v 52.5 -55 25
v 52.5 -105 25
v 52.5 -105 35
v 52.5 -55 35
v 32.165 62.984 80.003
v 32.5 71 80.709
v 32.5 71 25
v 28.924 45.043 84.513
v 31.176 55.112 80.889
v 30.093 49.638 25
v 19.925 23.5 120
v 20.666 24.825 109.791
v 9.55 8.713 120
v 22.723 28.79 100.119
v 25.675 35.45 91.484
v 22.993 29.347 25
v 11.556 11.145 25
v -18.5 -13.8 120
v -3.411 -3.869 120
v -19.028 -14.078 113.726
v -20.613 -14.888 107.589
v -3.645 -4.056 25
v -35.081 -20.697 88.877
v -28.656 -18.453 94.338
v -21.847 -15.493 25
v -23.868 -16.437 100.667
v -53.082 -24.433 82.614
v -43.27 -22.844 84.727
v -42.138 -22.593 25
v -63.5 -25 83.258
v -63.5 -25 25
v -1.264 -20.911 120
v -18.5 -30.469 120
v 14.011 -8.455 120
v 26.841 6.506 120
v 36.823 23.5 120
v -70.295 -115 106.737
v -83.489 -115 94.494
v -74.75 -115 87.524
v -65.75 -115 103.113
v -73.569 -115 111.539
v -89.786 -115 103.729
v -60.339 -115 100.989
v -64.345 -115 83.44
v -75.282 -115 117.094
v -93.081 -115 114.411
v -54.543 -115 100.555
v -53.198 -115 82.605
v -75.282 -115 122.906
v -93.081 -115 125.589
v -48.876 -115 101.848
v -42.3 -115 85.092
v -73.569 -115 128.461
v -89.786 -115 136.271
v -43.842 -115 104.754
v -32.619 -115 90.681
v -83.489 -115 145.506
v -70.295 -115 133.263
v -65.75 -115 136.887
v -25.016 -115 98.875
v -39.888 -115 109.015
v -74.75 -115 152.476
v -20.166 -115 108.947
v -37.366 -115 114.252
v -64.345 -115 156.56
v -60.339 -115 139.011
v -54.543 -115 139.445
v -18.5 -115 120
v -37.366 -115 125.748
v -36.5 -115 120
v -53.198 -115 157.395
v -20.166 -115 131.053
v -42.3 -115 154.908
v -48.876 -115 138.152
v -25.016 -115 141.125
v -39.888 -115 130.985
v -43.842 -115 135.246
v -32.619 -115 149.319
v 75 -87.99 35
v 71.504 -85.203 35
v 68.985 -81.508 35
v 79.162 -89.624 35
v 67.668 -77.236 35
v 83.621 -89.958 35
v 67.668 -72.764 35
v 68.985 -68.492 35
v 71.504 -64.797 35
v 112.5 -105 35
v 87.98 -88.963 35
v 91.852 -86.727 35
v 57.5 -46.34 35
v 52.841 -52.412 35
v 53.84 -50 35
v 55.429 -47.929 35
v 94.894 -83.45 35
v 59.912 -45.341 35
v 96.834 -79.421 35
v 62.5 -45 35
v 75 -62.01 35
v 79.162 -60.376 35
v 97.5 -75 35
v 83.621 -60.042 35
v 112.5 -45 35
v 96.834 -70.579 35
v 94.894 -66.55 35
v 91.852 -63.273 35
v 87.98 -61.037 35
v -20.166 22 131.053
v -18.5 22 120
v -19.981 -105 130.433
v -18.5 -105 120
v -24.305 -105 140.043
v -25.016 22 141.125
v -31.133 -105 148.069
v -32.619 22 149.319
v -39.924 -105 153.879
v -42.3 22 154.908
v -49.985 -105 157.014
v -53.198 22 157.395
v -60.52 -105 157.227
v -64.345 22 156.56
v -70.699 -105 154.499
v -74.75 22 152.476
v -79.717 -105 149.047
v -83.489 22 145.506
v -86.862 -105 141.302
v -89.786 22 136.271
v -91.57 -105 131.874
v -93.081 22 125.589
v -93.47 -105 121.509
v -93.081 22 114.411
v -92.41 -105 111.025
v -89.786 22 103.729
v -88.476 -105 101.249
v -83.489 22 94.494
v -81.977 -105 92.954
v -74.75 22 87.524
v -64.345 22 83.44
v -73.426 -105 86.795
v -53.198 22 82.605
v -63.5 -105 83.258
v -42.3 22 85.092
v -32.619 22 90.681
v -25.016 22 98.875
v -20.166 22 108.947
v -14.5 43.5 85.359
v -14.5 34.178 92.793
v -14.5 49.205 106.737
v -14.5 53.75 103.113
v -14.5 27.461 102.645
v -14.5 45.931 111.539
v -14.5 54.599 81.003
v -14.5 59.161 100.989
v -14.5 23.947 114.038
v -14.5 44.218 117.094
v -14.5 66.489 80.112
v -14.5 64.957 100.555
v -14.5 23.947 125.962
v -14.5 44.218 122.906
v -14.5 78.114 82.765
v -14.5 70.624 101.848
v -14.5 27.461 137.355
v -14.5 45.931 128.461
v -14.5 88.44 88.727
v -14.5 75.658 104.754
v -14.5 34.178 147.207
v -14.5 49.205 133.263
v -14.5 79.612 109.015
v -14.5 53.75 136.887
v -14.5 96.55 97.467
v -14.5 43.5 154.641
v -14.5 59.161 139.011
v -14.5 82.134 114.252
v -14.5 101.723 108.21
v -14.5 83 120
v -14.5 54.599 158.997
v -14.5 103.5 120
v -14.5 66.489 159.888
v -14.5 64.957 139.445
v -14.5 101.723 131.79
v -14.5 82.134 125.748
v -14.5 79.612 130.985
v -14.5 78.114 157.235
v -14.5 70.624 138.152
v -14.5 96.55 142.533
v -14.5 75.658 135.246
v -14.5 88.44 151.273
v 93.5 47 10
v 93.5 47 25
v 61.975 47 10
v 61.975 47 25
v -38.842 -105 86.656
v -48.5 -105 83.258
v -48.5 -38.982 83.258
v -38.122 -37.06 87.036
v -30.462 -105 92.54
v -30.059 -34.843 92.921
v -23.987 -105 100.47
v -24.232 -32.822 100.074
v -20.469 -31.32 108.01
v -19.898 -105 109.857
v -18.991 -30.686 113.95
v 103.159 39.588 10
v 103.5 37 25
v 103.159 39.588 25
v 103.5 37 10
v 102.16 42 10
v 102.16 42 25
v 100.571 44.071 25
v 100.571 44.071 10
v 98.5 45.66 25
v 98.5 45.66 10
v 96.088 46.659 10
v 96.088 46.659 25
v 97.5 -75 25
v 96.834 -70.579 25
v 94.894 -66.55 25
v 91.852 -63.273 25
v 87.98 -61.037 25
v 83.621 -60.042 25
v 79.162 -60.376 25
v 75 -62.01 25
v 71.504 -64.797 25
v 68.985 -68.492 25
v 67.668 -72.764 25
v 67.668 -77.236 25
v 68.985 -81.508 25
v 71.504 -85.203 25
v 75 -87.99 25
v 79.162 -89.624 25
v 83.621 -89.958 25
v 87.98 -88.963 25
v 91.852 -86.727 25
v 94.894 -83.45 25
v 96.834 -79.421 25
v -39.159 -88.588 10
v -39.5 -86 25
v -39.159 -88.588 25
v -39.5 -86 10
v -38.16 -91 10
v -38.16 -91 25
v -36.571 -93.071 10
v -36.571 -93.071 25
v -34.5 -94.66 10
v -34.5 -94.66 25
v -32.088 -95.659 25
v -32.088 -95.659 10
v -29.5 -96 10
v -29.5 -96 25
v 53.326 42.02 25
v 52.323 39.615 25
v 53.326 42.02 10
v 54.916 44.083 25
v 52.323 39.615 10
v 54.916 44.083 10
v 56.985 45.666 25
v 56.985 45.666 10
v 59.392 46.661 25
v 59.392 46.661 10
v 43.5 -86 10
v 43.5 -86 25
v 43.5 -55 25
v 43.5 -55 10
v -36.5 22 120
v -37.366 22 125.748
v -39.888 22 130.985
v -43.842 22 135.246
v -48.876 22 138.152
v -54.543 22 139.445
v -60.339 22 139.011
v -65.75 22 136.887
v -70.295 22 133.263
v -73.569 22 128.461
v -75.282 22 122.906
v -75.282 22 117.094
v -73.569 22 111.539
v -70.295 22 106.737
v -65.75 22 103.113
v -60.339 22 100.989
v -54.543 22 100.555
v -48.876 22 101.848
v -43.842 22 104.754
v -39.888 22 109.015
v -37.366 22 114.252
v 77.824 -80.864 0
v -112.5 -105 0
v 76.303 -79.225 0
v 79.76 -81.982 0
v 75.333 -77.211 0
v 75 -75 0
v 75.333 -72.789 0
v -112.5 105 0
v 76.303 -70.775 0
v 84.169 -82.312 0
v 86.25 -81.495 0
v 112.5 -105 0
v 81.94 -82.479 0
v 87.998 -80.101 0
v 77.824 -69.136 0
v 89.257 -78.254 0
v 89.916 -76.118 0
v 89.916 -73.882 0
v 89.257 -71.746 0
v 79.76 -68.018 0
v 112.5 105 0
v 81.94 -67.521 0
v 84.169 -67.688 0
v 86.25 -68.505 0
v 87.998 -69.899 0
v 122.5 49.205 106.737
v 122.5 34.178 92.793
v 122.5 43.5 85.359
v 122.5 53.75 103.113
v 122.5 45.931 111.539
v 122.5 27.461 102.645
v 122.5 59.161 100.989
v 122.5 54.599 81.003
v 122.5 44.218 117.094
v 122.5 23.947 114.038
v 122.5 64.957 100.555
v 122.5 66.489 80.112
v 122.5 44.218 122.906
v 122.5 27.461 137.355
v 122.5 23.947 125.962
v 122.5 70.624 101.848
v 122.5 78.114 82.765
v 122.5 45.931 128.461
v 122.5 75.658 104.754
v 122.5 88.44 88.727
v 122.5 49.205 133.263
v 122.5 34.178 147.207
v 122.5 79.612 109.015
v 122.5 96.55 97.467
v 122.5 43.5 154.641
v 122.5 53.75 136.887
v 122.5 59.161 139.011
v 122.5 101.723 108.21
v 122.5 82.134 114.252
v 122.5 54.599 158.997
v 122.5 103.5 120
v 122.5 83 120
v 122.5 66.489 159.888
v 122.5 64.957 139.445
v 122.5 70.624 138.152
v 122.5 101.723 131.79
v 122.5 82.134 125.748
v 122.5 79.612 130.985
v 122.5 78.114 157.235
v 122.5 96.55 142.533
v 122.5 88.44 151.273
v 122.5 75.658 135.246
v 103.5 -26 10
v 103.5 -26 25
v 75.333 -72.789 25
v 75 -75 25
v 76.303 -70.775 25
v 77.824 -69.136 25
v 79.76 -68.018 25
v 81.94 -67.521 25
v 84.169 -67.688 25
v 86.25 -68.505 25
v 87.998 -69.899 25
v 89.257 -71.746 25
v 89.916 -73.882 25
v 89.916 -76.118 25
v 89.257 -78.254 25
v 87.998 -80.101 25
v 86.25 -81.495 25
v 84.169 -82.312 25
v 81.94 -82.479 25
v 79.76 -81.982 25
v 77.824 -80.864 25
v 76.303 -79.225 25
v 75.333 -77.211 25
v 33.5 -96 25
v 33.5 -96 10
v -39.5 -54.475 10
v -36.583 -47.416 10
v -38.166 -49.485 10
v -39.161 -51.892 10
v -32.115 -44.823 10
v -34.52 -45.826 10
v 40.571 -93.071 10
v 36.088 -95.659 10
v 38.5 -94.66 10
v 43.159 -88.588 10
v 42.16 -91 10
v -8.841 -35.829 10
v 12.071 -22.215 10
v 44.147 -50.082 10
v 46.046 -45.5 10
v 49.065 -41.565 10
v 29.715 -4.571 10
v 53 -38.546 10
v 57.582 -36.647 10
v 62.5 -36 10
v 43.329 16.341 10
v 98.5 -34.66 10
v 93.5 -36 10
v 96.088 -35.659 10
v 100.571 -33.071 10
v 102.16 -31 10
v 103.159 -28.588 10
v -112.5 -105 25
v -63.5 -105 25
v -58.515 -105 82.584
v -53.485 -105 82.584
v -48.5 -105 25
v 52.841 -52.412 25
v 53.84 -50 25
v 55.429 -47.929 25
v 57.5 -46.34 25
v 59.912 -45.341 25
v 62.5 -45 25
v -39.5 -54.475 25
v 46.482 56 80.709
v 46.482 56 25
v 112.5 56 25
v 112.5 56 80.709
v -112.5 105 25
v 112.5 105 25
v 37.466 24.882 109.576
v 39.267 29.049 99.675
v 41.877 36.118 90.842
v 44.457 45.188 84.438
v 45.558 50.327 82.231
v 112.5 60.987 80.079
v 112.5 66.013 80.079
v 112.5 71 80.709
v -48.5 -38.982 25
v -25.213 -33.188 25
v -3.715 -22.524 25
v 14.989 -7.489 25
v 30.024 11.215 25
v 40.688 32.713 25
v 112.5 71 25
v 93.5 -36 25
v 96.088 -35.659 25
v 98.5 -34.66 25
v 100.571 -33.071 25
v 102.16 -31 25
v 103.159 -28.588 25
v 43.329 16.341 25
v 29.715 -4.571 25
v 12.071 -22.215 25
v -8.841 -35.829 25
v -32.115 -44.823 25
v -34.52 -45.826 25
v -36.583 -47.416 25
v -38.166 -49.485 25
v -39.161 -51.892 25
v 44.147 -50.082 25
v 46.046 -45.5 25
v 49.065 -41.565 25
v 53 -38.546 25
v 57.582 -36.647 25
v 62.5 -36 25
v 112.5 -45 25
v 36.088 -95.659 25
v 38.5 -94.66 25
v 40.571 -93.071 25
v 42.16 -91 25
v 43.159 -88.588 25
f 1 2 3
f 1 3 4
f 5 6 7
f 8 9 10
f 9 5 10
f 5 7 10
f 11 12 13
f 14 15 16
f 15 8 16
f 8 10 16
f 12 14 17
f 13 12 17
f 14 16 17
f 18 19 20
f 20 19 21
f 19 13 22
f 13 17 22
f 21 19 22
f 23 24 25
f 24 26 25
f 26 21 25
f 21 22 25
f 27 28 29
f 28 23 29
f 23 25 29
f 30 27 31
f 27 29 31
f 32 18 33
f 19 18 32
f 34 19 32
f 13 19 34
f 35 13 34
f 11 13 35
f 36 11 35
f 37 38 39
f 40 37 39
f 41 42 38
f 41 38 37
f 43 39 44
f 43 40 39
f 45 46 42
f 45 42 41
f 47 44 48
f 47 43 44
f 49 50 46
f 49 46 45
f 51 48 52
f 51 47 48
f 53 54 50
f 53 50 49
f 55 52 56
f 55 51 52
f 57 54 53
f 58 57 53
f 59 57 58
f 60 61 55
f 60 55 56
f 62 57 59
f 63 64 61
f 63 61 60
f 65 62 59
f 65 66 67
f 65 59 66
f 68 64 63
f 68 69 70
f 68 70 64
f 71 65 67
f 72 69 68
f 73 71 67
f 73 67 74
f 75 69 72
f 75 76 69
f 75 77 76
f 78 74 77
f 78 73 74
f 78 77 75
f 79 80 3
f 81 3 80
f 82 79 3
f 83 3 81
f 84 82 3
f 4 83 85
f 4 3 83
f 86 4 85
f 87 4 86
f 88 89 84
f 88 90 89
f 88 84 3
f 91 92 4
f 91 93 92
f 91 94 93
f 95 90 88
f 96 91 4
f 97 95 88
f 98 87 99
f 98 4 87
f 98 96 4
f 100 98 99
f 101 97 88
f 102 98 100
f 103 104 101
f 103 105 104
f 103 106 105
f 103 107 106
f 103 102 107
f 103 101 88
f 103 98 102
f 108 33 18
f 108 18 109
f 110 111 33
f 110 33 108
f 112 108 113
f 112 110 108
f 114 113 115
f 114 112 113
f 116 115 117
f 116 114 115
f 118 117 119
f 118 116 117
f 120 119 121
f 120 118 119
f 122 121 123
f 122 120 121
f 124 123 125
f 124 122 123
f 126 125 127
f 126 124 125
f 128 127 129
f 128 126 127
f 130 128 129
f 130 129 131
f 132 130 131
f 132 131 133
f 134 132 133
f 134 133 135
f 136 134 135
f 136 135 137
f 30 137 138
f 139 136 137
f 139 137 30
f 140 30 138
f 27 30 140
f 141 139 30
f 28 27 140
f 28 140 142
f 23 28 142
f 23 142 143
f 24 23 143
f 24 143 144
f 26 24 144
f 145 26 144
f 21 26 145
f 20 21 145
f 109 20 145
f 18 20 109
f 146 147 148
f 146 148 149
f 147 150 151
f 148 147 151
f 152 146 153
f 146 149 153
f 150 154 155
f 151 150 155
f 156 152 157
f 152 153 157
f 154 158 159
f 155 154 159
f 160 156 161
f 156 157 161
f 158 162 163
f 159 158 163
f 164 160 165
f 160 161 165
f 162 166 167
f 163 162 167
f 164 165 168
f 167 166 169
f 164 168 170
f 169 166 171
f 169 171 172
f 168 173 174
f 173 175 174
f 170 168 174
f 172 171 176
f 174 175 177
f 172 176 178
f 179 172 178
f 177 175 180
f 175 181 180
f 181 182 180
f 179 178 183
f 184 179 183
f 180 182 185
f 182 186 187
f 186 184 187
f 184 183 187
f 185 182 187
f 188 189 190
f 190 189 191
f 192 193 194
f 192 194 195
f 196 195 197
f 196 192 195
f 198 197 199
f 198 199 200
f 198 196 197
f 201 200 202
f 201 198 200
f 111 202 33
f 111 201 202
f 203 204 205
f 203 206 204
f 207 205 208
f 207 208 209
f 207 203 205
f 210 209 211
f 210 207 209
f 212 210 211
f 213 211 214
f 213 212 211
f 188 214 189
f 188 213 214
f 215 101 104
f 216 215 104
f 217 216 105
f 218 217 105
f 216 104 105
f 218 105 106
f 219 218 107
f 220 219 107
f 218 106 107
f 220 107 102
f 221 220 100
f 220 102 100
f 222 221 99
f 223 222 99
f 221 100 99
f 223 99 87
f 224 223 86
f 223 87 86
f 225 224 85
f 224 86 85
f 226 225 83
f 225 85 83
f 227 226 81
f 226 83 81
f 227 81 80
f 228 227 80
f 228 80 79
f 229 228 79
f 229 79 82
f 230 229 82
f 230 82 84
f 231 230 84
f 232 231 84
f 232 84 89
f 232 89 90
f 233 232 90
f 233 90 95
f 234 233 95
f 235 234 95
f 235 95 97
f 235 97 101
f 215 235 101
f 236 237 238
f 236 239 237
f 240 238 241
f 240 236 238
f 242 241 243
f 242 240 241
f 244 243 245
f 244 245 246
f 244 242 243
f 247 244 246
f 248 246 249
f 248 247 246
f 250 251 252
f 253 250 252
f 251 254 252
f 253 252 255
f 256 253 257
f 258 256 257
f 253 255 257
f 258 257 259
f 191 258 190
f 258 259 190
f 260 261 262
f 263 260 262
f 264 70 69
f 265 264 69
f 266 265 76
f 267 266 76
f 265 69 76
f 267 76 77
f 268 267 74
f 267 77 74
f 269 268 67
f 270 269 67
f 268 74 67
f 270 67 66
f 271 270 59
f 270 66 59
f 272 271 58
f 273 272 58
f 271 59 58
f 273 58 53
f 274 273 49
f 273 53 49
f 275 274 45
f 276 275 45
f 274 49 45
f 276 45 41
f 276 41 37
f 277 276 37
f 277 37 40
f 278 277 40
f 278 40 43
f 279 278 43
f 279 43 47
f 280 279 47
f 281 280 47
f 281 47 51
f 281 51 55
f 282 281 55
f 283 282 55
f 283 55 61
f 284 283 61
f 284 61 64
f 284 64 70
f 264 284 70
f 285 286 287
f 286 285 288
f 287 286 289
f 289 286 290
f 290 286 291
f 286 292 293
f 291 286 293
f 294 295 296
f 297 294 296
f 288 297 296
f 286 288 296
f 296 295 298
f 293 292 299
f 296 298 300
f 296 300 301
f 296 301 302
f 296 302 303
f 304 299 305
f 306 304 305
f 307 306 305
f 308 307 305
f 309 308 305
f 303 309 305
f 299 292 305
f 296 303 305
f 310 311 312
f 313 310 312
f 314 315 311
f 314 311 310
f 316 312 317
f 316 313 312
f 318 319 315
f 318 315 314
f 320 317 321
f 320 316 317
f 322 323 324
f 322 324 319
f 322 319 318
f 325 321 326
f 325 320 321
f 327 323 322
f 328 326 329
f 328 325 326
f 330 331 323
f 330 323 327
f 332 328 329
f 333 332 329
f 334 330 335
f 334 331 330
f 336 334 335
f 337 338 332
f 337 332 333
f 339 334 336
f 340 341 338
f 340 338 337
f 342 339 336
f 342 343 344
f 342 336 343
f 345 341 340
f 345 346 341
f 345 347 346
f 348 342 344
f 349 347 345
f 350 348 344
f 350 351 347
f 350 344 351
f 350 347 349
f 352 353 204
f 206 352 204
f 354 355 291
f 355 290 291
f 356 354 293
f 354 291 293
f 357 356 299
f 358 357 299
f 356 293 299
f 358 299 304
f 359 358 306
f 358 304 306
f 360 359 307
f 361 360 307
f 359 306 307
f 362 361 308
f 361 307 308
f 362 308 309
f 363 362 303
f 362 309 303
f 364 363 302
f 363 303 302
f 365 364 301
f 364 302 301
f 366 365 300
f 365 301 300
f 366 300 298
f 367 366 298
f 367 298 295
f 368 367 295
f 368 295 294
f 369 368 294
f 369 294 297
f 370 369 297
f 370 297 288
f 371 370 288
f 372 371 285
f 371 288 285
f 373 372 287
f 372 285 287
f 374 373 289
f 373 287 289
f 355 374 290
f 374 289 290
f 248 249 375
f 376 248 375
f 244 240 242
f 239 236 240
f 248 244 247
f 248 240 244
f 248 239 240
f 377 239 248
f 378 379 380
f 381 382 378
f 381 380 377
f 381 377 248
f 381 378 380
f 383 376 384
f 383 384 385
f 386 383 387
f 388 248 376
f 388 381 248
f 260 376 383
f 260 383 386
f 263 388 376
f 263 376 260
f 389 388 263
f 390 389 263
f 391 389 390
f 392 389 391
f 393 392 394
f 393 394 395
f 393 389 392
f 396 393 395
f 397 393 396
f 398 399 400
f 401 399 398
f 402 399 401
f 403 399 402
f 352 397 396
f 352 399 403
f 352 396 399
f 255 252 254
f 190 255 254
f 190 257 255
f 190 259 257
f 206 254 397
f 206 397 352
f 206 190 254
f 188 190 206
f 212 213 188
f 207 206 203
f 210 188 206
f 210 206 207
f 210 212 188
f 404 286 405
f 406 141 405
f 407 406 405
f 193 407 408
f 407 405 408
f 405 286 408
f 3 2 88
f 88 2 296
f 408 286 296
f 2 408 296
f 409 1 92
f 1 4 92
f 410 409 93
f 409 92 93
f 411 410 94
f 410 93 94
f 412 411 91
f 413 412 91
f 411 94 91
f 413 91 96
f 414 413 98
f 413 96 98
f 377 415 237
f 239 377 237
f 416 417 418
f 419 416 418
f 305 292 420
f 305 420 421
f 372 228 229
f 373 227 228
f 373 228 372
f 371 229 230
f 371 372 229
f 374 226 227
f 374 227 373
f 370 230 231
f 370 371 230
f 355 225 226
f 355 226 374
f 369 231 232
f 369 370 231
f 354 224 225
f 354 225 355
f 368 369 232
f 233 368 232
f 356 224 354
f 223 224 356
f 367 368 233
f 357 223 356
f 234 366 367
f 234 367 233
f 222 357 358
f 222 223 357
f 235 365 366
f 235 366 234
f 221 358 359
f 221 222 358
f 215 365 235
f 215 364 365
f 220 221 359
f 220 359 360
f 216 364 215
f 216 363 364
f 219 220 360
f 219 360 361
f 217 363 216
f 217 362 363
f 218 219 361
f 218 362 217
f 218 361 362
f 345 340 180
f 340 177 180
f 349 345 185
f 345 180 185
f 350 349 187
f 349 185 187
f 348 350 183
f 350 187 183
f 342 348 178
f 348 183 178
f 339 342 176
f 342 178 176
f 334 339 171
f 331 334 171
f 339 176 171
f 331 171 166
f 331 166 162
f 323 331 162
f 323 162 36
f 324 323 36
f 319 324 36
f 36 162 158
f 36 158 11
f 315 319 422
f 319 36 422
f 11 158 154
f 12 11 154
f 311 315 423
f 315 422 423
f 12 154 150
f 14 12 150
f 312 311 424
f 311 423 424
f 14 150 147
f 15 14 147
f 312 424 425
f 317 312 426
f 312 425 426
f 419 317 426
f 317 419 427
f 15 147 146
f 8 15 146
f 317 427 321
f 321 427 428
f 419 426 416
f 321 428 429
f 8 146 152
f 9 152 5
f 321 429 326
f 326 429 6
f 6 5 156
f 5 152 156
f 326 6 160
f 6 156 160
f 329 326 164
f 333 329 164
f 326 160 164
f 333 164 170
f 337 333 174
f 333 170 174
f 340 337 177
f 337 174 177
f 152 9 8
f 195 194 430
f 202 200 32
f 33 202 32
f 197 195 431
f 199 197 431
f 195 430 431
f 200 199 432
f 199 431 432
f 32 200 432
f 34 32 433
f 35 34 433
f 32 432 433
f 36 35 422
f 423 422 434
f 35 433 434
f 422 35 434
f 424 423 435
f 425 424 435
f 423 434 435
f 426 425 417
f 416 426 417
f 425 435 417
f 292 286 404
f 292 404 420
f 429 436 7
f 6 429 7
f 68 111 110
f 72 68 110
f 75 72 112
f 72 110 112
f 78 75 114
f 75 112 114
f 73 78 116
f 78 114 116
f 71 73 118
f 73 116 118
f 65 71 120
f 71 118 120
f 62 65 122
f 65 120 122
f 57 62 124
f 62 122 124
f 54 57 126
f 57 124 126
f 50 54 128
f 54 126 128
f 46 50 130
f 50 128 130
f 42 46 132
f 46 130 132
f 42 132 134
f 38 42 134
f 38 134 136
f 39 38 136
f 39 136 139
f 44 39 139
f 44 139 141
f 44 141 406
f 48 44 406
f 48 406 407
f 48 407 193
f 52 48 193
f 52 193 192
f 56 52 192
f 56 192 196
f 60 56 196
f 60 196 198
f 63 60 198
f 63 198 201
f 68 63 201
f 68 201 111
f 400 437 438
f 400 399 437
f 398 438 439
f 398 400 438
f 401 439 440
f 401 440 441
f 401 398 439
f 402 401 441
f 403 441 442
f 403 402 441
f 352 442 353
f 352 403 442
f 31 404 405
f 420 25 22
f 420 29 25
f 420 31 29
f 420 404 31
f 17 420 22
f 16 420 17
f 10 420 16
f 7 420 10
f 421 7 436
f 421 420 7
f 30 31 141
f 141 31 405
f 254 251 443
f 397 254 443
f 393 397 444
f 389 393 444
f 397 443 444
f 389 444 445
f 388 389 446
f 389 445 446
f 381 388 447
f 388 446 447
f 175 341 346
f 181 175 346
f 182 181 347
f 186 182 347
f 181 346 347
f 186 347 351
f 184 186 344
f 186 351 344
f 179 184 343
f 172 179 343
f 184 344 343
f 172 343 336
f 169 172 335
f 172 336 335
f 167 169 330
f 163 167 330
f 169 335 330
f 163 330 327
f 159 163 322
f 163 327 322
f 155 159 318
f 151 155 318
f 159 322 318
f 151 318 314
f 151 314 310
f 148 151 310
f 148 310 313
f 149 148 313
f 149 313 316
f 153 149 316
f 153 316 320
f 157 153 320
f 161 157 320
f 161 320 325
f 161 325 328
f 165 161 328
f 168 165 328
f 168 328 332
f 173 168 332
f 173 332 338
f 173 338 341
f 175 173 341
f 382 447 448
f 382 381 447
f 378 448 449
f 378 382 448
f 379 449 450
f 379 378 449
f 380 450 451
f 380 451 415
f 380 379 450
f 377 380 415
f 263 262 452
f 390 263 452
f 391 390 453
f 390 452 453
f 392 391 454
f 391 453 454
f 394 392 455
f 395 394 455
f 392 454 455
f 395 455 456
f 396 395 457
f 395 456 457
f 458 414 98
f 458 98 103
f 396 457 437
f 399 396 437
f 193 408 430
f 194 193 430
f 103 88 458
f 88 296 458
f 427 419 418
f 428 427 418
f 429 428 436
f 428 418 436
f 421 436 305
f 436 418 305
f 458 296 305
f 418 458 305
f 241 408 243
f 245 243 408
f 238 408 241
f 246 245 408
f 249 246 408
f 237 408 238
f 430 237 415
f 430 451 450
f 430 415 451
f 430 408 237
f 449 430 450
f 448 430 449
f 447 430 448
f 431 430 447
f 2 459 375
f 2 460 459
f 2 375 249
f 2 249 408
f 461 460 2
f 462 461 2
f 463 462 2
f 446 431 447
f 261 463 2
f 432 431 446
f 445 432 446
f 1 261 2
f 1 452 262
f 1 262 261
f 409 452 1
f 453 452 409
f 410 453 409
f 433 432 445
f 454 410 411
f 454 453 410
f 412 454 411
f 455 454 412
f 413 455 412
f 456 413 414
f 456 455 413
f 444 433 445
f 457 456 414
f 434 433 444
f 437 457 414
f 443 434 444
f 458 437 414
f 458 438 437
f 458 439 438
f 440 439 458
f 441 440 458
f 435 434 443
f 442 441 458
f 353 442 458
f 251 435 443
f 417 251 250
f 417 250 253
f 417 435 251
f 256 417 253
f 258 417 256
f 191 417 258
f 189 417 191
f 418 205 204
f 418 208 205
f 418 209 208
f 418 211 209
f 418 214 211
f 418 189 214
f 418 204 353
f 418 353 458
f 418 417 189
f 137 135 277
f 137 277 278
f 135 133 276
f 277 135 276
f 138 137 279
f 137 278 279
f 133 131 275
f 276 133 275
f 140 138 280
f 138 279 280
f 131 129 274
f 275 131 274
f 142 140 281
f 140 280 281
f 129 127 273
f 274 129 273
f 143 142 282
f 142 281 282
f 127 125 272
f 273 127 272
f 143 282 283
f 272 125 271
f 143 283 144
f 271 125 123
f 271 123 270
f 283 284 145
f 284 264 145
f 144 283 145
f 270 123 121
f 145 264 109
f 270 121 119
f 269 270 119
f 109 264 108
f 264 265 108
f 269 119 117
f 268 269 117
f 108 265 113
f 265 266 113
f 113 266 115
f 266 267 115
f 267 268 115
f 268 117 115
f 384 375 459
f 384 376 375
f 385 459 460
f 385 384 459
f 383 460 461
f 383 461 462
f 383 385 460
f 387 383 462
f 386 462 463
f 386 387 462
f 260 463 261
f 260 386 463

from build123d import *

# Parameters (mm, degrees)
F0_W            = 225
F0_H            = 210
F1_DEPTH        = 25
F3_DEPTH        = 95
F4_R            = 37.5
F5_DEPTH        = 10
F5_DEPTH_BACK   = 127
F6_R            = 40
F7_DEPTH        = 10
F7_DEPTH_BACK   = 127
F8_W            = 60
F8_H            = 60
F9_DEPTH        = 10
F10_R           = 10
F12_DEPTH       = 15
F14_D           = 15
F14_CBORE_D     = 30
F14_CBORE_DEPTH = 10
F15_R           = 10
F16_R           = 19.5
F17_DEPTH       = 220.001
F18_R           = 19.5
F19_DEPTH       = 235.001


with BuildPart() as f1:
    # F0 (on Top) → F1 (new body)
    with BuildSketch(Plane.XY):
        Rectangle(F0_W, F0_H)
    extrude(amount=F1_DEPTH)

    # F2 (on face) → F3 (join)
    with BuildSketch(Plane.XY.offset(25)):
        with BuildLine():
            Line((-63.5, -25), (-63.5, -105))
            Line((-63.5, -105), (-48.5, -105))
            Line((-48.5, -105), (-48.5, -38.981817))
            ThreePointArc((-48.5, -38.981817), (14.988853, -7.488853), (46.481817, 56))
            Line((46.481817, 56), (112.5, 56))
            Line((112.5, 56), (112.5, 71))
            Line((112.5, 71), (32.5, 71))
            ThreePointArc((32.5, 71), (4.382251, 3.117749), (-63.5, -25))
        make_face()
    extrude(amount=F3_DEPTH)

    # F4 (on face) → F5 (join, two sides)
    with BuildSketch(Plane.XZ.offset(105)) as f5_sk:
        with Locations((-56, 120)):
            Circle(F4_R)
    extrude(amount=F5_DEPTH)
    extrude(f5_sk.sketch, amount=-F5_DEPTH_BACK)

    # F6 (on face) → F7 (join, two sides)
    with BuildSketch(Plane.YZ.offset(112.5)) as f7_sk:
        with Locations((63.5, 120)):
            Circle(F6_R)
    extrude(amount=F7_DEPTH)
    extrude(f7_sk.sketch, amount=-F7_DEPTH_BACK)

    # F8 (on face) → F9 (join)
    with BuildSketch(Plane.XY.offset(25)):
        with Locations((82.5, -75)):
            Rectangle(F8_W, F8_H)
    extrude(amount=F9_DEPTH)

    # F10
    f10_edges = [f1.edges().sort_by_distance(p)[0] for p in [
        (52.5, -45, 30),
    ]]
    fillet(f10_edges, radius=F10_R)

    # F11 (on face) → F12 (cut)
    with BuildSketch(Plane.XY.offset(25)):
        with BuildLine():
            ThreePointArc((54.075507, 47.000001), (21.352813, -13.852813), (-39.500001, -46.575507))
            Line((-39.500001, -46.575507), (-39.500001, -96.000001))
            Line((-39.500001, -96.000001), (43.500001, -96.000001))
            Line((43.500001, -96.000001), (43.500001, -55))
            ThreePointArc((43.500001, -55), (49.064972, -41.564972), (62.5, -36.000001))
            Line((62.5, -36.000001), (103.500001, -36.000001))
            Line((103.500001, -36.000001), (103.500001, 47.000001))
            Line((103.500001, 47.000001), (54.075507, 47.000001))
        make_face()
    extrude(amount=-F12_DEPTH, mode=Mode.SUBTRACT)

    # F14 (through all)
    with Locations(Plane.XY.offset(35)):
        with Locations((82.5, -75)):
            CounterBoreHole(F14_D / 2, F14_CBORE_D / 2, F14_CBORE_DEPTH)

    # F15
    f15_edges = [f1.edges().sort_by_distance(p)[0] for p in [
        (103.500001, -36.000001, 17.5),
        (43.500001, -96.000001, 17.5),
        (-39.500001, -46.575507, 17.5),
        (54.075507, 47.000001, 17.5),
        (-39.500001, -96.000001, 17.5),
        (103.500001, 47.000001, 17.5),
    ]]
    fillet(f15_edges, radius=F15_R)

    # F16 (on face) → F17 (cut, through all)
    with BuildSketch(Plane.XZ.offset(115)):
        with Locations((-56, 120)):
            Circle(F16_R)
    extrude(amount=-F17_DEPTH, mode=Mode.SUBTRACT)

    # F18 (on face) → F19 (cut, through all)
    with BuildSketch(Plane.YZ.offset(122.5)):
        with Locations((63.5, 120)):
            Circle(F18_R)
    extrude(amount=-F19_DEPTH, mode=Mode.SUBTRACT)


solid = f1.part
